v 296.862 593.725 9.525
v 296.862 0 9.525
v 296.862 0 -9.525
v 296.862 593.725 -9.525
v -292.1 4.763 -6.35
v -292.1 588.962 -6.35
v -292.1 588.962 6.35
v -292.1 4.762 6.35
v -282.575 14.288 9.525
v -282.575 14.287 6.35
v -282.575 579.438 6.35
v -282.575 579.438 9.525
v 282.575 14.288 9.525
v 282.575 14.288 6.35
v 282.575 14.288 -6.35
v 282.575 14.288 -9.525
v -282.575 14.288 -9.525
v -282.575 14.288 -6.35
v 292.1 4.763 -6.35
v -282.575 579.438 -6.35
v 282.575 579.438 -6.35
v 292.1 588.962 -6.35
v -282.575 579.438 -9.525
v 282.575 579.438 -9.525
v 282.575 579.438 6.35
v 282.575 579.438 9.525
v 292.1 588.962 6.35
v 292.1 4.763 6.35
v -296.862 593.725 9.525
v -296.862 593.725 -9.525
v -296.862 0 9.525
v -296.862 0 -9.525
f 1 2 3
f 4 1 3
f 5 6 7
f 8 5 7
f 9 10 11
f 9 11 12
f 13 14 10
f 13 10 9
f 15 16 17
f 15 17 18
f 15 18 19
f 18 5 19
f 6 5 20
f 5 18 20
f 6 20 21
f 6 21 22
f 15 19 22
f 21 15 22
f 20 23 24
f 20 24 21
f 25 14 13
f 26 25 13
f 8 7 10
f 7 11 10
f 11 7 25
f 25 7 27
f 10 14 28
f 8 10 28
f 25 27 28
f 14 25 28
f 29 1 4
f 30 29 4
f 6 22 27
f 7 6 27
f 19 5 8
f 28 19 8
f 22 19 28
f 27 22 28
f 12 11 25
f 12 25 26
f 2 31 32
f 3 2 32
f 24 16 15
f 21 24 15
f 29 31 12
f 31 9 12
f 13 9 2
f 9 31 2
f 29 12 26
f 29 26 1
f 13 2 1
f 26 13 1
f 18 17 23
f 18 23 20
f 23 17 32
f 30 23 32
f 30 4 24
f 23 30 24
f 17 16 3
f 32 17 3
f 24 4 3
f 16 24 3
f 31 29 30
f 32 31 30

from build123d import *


with BuildPart() as part:
    # Sweep1: sweep along a path in Sketch2
    with BuildLine(Plane.XY) as sweep1_path:
        Line((-296.8625, 593.725), (296.8625, 593.725))
        Line((296.8625, 593.725), (296.8625, 0))
        Line((296.8625, 0), (-296.8625, 0))
        Line((-296.8625, 0), (-296.8625, 593.725))
    # Sketch1 → Sweep1 (sweep)
    with BuildSketch(Plane(origin=(0, 0, 0), x_dir=(0, 0, -1), z_dir=(1, 0, 0))):
        Polygon((-9.525, 14.2875), (-9.525, 0), (9.525, 0), (9.525, 14.2875), (6.35, 14.2875), (6.35, 4.7625), (-6.35, 4.7625), (-6.35, 14.2875), align=None)
    sweep(path=sweep1_path.line, transition=Transition.RIGHT)


solid = part.part
